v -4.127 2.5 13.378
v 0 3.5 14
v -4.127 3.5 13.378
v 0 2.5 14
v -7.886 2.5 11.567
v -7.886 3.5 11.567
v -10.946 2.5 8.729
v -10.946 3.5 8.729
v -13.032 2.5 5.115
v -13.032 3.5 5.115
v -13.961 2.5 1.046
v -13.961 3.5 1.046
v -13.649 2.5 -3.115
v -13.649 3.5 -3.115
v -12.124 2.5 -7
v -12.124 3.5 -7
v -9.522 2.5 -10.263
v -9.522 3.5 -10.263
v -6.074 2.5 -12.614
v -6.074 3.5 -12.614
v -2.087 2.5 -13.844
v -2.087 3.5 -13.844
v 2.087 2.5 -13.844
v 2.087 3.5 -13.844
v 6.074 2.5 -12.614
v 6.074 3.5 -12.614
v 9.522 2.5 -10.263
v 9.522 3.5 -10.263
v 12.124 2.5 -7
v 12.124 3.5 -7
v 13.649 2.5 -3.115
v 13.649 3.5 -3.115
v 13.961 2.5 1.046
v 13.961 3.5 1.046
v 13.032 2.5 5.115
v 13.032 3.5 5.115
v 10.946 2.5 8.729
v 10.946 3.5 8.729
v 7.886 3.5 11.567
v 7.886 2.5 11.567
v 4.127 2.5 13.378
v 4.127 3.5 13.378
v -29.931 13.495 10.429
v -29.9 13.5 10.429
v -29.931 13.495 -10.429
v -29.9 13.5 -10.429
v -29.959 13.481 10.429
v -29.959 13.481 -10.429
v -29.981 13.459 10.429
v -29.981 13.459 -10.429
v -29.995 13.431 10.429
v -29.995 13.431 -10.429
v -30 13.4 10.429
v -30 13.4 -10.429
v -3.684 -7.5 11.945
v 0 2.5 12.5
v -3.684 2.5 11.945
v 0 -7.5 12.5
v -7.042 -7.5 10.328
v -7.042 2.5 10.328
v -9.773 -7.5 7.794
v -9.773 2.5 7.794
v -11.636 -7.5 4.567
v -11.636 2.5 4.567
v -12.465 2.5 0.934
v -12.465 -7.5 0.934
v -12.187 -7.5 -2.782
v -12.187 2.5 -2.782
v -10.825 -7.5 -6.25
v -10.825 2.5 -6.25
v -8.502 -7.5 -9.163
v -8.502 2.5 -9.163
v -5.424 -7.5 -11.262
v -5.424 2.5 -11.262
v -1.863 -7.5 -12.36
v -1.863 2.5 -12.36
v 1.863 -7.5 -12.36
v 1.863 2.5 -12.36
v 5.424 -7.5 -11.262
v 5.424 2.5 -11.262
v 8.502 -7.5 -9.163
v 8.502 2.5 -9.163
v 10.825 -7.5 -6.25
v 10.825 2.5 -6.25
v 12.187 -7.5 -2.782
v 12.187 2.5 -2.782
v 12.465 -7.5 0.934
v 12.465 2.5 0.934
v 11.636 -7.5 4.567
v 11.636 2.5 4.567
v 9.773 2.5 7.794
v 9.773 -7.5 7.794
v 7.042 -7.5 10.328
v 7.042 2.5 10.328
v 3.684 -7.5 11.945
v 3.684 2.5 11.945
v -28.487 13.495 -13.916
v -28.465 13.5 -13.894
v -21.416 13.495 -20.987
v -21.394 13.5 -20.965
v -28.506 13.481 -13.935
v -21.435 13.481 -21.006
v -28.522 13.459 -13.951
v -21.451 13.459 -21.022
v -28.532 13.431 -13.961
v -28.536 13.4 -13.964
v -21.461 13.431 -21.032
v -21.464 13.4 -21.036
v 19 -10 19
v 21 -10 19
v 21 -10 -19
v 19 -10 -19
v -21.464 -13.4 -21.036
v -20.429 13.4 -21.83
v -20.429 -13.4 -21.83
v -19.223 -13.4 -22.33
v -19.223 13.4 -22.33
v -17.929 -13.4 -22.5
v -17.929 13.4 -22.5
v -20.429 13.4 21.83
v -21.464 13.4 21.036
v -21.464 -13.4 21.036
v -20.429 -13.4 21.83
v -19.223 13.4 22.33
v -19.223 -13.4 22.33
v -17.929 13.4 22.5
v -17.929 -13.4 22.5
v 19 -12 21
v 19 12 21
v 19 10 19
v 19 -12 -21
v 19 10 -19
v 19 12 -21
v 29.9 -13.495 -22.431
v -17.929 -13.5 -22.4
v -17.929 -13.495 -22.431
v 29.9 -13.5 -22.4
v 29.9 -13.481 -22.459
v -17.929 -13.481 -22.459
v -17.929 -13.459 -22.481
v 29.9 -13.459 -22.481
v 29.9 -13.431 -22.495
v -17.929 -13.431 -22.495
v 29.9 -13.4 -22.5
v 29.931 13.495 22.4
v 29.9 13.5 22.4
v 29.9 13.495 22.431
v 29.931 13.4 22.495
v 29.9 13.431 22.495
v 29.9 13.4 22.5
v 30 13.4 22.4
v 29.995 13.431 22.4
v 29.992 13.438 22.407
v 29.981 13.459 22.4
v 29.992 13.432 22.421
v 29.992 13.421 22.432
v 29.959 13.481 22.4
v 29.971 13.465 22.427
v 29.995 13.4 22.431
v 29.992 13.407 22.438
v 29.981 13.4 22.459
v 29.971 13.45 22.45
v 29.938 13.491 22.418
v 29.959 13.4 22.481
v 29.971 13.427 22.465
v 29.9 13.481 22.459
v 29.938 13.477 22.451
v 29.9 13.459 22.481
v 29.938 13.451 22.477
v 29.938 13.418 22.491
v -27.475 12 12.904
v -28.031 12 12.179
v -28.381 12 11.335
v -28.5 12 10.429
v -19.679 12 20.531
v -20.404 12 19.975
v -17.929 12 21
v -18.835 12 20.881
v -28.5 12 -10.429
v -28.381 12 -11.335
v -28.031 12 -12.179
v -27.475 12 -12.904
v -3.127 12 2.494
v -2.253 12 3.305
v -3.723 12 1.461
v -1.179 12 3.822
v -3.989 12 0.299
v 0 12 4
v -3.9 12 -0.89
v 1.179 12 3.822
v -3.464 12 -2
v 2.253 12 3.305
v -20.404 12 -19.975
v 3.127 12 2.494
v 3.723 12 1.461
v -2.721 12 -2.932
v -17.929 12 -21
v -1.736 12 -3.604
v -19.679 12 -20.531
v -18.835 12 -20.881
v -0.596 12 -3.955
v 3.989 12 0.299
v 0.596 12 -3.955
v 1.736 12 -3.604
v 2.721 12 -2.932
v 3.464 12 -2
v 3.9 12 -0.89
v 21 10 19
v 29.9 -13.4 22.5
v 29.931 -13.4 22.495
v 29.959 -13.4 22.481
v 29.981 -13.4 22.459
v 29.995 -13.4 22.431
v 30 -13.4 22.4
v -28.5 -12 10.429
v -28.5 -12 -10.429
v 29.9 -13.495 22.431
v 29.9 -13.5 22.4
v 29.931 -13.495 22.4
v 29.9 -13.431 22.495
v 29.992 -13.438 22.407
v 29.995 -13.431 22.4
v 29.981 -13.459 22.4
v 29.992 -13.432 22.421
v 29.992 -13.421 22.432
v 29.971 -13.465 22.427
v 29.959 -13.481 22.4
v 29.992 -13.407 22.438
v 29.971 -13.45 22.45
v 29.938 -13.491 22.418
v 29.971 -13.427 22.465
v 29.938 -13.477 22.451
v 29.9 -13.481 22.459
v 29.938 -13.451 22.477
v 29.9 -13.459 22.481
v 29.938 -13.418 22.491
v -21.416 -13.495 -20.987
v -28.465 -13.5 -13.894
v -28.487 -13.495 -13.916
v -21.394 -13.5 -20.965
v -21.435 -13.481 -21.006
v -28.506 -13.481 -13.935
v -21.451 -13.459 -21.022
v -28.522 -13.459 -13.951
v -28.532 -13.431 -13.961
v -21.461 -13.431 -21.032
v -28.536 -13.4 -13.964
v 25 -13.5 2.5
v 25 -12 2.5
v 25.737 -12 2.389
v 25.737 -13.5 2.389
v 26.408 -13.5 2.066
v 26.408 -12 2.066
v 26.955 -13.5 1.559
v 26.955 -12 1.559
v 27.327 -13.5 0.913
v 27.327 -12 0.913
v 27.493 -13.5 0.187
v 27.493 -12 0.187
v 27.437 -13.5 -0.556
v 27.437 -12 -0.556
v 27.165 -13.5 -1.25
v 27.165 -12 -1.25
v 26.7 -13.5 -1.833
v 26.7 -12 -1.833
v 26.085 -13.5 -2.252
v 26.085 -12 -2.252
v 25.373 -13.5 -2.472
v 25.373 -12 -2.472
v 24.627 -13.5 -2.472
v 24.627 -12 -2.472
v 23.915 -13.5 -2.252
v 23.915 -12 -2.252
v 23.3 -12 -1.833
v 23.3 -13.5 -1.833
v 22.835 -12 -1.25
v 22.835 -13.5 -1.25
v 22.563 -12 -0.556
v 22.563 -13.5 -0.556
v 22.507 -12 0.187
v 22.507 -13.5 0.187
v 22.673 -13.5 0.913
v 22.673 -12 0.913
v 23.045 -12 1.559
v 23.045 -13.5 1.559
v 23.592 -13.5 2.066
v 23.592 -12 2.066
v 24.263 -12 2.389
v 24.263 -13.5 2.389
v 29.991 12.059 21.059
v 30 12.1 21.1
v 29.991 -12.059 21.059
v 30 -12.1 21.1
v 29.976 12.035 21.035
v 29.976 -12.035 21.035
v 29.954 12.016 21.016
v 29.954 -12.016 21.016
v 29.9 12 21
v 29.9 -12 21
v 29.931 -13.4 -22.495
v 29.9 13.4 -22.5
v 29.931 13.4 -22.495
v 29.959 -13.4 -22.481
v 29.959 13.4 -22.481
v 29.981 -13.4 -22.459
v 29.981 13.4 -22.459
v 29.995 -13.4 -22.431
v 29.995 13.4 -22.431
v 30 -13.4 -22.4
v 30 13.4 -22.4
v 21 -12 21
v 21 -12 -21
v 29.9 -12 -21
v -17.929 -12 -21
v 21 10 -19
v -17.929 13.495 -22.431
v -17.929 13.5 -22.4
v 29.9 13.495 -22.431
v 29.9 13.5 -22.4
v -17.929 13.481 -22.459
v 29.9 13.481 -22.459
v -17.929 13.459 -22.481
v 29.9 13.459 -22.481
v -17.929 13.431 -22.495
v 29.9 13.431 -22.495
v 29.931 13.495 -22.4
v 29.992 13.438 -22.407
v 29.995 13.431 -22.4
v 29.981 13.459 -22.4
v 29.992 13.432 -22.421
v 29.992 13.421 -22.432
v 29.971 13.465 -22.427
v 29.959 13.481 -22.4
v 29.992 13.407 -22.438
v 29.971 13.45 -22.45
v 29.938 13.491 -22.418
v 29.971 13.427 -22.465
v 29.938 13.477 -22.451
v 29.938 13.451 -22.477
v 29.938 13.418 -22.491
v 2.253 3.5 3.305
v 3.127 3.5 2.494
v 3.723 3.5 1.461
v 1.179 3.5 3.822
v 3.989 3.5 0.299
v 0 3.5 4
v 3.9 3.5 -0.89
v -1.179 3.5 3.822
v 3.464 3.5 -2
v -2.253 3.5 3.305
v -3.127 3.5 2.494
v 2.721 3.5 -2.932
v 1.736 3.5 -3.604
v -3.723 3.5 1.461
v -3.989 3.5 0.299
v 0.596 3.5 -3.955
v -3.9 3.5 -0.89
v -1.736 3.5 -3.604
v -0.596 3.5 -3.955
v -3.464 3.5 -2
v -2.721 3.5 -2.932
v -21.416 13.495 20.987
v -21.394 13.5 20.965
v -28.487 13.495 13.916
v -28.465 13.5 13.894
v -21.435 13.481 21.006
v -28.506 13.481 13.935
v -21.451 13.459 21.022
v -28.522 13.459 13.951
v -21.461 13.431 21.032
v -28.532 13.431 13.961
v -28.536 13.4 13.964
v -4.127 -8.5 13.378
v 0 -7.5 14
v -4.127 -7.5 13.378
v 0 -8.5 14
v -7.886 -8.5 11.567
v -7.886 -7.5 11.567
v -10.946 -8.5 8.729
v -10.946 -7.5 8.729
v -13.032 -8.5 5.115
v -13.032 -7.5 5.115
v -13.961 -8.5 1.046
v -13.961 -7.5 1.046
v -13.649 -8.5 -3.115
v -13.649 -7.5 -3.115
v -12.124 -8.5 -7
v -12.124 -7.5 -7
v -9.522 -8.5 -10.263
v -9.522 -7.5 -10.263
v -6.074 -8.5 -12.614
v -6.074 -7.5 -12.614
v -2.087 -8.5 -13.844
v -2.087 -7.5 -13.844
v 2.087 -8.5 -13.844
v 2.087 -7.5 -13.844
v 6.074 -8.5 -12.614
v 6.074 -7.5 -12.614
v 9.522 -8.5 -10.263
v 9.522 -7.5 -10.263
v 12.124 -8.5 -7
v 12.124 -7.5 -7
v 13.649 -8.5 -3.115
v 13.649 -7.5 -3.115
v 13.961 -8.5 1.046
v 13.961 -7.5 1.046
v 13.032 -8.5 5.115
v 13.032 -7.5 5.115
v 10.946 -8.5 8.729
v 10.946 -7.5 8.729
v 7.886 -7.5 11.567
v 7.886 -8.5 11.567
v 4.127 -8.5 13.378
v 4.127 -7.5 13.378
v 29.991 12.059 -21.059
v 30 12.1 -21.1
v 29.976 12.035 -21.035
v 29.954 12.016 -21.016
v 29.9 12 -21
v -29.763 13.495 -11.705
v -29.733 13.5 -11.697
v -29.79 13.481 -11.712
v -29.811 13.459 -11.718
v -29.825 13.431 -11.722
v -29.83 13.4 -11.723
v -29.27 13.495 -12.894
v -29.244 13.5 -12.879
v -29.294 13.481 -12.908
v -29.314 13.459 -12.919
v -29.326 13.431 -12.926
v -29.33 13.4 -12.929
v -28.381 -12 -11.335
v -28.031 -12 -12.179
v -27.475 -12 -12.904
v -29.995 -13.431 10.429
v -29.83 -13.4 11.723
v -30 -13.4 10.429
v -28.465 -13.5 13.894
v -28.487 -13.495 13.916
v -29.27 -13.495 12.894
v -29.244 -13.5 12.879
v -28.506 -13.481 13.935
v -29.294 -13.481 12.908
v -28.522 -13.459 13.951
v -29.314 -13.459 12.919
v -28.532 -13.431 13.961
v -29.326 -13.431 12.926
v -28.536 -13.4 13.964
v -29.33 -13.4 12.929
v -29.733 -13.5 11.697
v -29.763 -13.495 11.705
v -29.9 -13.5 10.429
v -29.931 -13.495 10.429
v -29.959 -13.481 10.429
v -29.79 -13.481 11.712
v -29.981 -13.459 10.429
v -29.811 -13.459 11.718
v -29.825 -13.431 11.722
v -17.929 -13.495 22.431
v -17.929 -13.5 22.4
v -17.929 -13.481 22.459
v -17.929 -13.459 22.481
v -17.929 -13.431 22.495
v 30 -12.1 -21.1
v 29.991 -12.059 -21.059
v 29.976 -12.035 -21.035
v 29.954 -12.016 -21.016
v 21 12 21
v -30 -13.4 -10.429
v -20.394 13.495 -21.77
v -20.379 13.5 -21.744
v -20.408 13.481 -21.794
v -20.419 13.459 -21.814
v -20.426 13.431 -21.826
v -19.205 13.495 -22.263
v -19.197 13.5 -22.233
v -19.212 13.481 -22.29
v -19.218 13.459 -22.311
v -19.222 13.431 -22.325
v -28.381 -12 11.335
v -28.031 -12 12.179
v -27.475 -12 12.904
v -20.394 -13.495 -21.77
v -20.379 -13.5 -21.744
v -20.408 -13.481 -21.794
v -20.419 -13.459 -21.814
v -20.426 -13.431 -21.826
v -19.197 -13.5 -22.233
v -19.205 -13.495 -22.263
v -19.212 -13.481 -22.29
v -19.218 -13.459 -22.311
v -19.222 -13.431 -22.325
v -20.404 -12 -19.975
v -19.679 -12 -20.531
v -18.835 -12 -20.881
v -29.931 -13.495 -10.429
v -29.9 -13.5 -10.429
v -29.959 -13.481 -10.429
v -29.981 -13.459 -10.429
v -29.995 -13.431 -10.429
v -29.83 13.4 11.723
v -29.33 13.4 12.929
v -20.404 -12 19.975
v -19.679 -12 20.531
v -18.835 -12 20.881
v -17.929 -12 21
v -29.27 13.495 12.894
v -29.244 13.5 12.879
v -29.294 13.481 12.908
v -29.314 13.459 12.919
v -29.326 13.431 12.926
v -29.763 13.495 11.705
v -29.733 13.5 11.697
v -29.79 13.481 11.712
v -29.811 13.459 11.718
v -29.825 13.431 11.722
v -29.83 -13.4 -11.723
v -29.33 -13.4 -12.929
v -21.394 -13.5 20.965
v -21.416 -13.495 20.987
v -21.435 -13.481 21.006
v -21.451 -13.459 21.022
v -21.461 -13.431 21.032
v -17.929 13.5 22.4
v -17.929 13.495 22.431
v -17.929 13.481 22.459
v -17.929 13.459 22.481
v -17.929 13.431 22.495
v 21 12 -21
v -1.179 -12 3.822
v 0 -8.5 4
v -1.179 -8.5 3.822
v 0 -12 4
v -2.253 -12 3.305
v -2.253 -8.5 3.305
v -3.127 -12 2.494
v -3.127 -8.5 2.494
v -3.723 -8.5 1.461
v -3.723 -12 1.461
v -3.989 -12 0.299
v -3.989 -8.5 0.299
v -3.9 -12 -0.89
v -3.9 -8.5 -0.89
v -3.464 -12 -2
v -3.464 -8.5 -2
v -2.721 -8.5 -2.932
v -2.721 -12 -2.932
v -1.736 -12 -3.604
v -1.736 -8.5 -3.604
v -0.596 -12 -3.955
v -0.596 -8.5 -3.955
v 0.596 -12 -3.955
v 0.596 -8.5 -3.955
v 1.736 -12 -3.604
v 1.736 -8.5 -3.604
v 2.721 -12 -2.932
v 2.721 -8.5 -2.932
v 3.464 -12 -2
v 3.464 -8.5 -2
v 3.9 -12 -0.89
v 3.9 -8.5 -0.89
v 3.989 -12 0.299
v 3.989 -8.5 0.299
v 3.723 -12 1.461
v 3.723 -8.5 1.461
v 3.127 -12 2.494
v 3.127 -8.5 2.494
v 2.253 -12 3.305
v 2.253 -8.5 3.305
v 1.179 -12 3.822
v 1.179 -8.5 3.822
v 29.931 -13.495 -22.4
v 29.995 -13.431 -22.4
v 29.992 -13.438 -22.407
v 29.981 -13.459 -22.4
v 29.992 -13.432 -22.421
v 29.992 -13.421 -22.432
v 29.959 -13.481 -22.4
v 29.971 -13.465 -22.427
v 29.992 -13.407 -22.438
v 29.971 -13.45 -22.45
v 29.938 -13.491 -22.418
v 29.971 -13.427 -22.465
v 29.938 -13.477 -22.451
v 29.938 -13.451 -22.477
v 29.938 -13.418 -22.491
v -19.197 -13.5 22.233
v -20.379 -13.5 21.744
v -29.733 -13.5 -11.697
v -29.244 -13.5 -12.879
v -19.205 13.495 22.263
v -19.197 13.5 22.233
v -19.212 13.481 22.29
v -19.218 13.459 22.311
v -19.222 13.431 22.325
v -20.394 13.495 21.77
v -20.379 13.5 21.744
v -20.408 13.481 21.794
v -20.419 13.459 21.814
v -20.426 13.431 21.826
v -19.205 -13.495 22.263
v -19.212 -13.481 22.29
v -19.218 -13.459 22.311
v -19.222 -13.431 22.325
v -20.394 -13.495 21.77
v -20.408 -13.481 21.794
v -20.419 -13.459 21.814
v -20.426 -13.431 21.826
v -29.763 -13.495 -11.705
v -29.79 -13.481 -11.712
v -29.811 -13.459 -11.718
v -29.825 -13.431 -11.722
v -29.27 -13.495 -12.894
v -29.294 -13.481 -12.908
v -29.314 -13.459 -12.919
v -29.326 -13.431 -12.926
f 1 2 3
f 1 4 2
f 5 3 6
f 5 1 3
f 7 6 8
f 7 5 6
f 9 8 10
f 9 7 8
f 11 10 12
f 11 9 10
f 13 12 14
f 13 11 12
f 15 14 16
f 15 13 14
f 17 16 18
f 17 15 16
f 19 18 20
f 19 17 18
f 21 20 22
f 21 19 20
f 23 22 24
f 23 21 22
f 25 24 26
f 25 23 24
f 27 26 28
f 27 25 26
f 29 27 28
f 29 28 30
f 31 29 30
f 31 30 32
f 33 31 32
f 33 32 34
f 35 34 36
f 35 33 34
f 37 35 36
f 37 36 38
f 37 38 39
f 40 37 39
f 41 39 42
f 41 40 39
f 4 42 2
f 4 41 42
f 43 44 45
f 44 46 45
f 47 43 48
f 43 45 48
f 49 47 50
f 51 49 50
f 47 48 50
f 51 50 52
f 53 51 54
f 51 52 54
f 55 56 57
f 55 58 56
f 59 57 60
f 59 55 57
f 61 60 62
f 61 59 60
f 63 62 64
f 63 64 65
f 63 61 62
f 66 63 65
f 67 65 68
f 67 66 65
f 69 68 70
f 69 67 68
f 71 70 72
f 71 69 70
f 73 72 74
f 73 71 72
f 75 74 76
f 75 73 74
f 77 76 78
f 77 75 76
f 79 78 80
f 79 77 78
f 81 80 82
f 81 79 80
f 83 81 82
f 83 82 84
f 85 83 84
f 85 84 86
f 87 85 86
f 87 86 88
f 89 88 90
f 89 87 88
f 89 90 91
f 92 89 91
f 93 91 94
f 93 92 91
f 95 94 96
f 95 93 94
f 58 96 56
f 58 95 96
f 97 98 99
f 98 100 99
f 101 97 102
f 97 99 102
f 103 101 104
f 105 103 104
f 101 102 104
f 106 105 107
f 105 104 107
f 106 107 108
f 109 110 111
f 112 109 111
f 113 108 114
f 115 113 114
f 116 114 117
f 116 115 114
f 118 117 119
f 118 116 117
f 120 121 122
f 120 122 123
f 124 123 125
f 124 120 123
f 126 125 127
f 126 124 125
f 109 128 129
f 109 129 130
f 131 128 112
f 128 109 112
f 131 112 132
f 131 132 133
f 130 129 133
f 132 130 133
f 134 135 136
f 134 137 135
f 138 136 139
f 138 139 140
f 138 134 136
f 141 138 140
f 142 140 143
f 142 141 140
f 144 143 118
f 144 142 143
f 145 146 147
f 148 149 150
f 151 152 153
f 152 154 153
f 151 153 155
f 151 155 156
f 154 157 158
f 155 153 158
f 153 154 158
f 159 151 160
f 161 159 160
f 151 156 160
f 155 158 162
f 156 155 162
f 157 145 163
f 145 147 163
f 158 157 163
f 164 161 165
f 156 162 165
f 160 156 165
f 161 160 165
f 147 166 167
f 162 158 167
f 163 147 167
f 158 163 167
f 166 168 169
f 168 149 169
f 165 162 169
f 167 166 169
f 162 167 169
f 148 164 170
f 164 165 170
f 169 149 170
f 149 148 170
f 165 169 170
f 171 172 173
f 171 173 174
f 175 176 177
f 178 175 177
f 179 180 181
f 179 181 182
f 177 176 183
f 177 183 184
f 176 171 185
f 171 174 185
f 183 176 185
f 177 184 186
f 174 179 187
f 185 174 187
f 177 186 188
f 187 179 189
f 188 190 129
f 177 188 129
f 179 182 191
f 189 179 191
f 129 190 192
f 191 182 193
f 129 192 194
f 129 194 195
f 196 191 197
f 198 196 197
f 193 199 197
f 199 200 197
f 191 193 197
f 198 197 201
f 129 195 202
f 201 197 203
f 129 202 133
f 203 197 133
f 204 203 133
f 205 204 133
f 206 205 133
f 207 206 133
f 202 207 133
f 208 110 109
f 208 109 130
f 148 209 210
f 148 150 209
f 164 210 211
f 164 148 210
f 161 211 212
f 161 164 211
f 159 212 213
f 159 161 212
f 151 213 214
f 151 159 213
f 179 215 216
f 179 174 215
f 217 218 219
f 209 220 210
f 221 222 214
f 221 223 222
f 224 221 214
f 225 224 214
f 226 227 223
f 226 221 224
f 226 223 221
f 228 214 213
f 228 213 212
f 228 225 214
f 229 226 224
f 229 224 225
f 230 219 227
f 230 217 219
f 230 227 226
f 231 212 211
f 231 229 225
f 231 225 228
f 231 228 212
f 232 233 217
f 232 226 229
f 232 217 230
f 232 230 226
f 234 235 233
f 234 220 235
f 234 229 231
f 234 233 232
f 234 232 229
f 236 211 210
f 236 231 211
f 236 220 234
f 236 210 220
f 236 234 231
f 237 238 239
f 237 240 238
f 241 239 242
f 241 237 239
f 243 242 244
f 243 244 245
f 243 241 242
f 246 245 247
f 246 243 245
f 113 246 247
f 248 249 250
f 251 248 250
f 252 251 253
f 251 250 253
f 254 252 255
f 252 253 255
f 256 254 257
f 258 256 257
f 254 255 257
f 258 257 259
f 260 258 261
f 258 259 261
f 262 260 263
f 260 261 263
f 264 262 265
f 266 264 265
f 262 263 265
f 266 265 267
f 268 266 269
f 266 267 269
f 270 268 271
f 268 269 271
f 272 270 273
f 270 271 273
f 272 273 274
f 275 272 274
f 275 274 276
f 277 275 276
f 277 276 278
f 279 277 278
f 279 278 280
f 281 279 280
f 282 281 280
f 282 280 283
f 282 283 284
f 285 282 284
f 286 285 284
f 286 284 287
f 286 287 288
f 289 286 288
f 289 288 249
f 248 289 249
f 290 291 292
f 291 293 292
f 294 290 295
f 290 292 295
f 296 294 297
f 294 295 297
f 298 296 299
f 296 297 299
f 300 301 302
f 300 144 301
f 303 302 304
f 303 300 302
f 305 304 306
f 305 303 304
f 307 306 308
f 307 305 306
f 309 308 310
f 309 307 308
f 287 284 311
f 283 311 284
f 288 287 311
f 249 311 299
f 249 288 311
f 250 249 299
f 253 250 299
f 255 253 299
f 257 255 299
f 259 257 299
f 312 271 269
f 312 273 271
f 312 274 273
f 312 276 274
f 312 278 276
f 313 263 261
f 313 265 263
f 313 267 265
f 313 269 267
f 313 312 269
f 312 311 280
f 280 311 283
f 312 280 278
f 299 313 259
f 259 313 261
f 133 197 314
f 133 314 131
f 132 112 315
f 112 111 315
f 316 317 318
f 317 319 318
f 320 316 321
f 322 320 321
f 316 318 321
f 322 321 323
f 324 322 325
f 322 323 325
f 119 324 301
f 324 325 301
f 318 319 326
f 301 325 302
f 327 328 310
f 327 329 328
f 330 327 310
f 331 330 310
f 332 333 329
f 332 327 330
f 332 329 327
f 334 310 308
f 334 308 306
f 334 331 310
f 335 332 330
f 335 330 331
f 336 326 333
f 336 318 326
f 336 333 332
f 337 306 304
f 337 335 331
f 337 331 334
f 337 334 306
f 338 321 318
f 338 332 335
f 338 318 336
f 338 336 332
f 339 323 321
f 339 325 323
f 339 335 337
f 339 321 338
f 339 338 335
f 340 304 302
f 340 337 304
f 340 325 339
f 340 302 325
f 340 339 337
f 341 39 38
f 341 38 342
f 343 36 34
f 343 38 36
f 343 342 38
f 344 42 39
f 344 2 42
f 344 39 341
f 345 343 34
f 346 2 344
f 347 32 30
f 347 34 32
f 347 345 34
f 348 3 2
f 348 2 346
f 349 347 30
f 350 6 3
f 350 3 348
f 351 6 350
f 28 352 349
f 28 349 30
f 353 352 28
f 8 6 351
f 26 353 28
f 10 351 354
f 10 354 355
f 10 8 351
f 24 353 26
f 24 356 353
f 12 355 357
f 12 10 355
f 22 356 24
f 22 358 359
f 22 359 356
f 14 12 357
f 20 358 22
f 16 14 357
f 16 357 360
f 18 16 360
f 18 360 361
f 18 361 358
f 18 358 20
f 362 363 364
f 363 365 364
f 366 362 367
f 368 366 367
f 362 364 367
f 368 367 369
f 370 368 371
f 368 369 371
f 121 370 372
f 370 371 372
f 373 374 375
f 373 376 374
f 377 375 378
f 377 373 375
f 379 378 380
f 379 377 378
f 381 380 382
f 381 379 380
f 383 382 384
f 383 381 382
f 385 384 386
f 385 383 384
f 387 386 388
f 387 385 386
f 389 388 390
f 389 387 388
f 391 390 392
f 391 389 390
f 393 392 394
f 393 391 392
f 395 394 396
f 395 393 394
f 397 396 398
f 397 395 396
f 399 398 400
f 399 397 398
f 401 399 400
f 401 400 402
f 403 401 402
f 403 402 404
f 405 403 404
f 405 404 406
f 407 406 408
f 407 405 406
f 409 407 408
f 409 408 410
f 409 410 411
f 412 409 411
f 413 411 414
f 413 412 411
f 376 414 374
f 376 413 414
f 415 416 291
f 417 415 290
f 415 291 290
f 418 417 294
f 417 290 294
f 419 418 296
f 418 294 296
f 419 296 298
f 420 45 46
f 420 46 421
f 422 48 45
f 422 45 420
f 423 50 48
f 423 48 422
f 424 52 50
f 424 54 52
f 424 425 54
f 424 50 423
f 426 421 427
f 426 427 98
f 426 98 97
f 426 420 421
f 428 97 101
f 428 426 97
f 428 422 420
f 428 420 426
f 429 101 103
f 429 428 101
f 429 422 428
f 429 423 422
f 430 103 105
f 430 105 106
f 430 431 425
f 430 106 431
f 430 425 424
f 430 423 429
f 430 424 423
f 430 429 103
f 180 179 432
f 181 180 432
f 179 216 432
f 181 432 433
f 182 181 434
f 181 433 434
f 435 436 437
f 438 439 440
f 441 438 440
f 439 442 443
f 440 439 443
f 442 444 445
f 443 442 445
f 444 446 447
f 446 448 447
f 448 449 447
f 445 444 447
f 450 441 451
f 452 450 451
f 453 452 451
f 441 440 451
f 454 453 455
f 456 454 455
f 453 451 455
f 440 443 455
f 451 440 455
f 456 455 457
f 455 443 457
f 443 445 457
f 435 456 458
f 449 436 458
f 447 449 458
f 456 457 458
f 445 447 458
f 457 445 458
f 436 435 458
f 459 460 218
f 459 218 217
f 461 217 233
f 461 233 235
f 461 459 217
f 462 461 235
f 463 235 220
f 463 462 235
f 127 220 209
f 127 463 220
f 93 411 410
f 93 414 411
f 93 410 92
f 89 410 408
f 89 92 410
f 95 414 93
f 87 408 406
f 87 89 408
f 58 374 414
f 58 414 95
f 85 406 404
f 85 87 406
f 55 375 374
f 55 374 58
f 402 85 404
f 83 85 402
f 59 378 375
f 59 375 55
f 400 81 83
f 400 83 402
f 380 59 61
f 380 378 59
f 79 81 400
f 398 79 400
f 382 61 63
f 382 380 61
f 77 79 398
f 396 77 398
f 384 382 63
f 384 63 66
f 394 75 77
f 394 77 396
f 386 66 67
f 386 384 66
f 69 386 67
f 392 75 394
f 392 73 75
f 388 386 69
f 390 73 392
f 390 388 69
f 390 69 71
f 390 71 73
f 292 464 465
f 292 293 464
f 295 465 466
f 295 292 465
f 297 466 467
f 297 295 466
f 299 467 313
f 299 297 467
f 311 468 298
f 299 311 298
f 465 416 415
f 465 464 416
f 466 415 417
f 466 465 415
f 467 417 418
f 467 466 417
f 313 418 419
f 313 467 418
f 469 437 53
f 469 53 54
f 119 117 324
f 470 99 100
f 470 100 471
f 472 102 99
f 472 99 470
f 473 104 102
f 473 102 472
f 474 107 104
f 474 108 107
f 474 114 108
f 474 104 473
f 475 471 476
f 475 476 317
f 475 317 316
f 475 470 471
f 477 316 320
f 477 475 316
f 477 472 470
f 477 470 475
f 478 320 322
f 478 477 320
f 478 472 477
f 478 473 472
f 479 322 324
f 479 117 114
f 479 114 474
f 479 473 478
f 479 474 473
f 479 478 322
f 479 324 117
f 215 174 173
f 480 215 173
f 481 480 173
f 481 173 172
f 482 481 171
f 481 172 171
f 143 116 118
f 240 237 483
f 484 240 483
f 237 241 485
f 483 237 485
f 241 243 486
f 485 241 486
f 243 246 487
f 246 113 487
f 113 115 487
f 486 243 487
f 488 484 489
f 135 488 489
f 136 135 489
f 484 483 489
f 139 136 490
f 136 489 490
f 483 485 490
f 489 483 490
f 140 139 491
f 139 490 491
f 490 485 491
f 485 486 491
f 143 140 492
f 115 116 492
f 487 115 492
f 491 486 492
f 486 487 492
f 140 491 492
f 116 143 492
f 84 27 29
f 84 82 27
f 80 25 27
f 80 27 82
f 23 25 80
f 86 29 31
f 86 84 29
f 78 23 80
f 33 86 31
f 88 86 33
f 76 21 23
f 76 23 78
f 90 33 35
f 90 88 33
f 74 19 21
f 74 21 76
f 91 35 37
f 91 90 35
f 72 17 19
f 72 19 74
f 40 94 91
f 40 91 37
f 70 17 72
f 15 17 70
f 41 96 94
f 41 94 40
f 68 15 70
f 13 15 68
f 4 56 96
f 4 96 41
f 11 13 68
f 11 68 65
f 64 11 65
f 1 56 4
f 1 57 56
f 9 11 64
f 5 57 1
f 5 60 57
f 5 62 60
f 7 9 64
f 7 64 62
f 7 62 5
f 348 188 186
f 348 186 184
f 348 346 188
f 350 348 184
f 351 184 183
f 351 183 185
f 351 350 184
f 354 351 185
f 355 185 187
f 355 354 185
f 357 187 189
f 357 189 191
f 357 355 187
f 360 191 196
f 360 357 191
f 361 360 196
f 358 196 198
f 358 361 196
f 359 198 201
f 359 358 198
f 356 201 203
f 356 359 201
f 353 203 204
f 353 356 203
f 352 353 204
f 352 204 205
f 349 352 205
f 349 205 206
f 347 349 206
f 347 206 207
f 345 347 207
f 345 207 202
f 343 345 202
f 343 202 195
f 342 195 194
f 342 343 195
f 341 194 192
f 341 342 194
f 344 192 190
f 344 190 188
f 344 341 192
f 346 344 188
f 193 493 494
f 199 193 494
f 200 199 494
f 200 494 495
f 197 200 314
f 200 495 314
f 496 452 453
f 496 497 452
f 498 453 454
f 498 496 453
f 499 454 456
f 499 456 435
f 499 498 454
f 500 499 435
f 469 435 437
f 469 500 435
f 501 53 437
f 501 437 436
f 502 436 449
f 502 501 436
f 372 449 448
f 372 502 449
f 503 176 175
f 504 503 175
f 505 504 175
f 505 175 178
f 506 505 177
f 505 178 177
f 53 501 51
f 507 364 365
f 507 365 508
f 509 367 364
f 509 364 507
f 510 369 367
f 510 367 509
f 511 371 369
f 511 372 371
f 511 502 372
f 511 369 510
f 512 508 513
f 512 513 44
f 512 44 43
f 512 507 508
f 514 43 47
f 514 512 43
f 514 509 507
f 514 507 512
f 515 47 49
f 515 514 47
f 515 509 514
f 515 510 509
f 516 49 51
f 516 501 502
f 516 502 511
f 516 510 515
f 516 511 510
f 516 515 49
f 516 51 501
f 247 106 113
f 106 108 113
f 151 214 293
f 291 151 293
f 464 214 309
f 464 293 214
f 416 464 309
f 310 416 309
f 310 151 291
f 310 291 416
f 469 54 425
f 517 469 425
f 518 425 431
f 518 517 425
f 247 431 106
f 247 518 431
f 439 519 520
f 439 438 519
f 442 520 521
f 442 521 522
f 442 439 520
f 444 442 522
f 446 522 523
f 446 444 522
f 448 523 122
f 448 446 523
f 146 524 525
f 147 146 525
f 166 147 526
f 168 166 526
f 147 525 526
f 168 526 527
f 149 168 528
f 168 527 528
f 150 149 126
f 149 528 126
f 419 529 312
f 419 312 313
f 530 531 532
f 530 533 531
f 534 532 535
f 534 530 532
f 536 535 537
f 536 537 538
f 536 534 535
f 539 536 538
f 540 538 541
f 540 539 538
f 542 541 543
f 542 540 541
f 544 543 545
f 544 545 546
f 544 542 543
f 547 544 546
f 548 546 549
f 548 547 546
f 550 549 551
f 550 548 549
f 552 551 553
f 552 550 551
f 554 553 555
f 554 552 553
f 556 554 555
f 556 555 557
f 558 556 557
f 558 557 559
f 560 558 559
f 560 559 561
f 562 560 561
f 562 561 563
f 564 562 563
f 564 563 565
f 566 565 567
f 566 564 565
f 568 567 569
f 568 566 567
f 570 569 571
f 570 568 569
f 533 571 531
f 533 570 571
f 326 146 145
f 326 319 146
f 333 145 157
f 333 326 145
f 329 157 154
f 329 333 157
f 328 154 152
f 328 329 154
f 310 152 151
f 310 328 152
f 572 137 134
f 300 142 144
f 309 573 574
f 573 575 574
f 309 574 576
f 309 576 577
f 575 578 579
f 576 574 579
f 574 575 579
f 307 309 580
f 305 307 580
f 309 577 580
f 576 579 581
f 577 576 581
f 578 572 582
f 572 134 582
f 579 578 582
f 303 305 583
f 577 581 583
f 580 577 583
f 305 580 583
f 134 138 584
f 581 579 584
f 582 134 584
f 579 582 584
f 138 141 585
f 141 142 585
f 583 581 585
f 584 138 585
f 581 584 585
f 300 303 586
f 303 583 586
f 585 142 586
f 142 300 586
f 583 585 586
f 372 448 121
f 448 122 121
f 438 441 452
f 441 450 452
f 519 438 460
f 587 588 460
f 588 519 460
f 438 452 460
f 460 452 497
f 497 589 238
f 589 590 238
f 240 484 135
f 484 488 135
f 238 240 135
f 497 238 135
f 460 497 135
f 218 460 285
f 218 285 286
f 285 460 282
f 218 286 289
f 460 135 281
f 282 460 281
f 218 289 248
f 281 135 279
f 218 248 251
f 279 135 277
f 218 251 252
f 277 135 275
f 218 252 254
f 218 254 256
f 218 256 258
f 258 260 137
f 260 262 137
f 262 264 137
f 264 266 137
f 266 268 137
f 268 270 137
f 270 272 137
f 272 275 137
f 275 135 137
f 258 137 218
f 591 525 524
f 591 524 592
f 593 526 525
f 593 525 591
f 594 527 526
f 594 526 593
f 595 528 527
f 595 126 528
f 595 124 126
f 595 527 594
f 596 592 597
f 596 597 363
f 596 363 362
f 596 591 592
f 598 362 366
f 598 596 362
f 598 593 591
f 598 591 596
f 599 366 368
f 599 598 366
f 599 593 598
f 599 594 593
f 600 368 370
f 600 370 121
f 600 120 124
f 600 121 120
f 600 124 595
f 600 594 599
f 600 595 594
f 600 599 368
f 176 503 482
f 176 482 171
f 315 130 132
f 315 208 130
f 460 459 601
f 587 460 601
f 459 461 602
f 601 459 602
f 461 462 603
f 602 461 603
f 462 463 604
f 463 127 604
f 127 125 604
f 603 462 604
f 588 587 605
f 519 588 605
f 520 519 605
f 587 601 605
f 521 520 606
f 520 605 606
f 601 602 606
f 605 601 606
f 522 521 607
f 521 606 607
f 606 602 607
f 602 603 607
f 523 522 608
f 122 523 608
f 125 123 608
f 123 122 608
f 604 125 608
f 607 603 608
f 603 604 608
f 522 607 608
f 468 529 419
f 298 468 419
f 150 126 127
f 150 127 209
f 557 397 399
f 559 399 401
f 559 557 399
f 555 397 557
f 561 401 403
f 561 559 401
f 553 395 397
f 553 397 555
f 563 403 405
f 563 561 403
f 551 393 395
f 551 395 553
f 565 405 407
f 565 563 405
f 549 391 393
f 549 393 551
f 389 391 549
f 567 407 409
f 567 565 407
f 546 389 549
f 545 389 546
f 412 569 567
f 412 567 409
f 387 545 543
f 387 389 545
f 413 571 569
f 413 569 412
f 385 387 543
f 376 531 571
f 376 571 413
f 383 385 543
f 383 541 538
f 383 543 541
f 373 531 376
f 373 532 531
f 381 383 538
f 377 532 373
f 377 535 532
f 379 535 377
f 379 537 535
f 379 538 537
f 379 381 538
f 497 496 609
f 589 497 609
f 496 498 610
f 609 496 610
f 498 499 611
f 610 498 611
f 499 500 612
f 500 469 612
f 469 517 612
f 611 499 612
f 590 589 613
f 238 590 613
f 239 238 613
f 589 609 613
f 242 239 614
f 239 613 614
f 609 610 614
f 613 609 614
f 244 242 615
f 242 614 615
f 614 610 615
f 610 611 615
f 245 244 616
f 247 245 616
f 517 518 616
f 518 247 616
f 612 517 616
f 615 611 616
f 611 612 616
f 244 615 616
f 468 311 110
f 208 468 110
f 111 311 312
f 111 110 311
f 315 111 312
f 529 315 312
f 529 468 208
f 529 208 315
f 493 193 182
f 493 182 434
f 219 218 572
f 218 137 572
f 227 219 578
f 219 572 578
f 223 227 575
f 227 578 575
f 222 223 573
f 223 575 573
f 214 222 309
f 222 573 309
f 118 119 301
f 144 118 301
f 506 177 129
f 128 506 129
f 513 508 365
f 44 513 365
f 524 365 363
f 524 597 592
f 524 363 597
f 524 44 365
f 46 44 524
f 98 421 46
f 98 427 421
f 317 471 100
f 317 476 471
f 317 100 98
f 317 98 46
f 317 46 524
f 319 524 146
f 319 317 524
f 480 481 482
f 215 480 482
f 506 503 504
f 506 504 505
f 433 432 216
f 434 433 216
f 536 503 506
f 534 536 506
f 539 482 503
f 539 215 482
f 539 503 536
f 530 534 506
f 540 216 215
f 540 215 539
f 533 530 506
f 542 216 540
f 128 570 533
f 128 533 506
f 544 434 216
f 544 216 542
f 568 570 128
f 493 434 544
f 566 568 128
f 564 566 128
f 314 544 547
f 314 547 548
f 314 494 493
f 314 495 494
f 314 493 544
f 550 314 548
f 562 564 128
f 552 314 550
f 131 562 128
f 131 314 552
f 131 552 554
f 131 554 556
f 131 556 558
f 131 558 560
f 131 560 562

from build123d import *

# Parameters (mm, degrees)
SKETCH_1_W          = 60
SKETCH_1_H          = 45
EXTRUDE_1_DEPTH     = 13.5
CHAMFER_1_SIZE      = 10
FILLET_1_R          = 5
SHELL_1_T           = -1.5
FILLET_2_R          = 0.1
SKETCH_4_W          = 42
SKETCH_4_H          = 24
SKETCH_4_W_2        = 38
SKETCH_4_H_2        = 20
EXTRUDE_1_2_DEPTH   = 1
CUT_EXTRUDE_1_REACH = 47.349
SKETCH_7_R          = 2.5


with BuildPart() as part:
    # 草图1 → Extrude 1 (new, symmetric)
    with BuildSketch(Plane(origin=(0, 0, 0), x_dir=(1, 0, 0), z_dir=(0, 1, 0))):
        Rectangle(SKETCH_1_W, SKETCH_1_H)
    extrude(amount=EXTRUDE_1_DEPTH, both=True)

    # 倒角1
    chamfer_1_edges = [part.edges().sort_by_distance(p)[0] for p in [
        (-30, 0, 22.5),
        (-30, 0, -22.5),
    ]]
    chamfer(chamfer_1_edges, length=CHAMFER_1_SIZE)

    # 圆角1
    fillet_1_edges = [part.edges().sort_by_distance(p)[0] for p in [
        (-30, 0, 12.5),
        (-30, 0, -12.5),
        (-20, 0, -22.5),
        (-20, 0, 22.5),
    ]]
    fillet(fillet_1_edges, radius=FILLET_1_R)

    # 抽壳1
    shell_1_openings = [part.faces().sort_by_distance(p)[0] for p in [
        (30, 0, 0),
    ]]
    offset(amount=SHELL_1_T, openings=shell_1_openings, kind=Kind.INTERSECTION)

    # 圆角2
    fillet_2_edges = [part.edges().sort_by_distance(p)[0] for p in [
        (-25, 13.5, -17.5),
        (-30, 13.5, 0),
        (-25, 13.5, 17.5),
        (6.035533906, 13.5, 22.5),
        (-19.84234935, 13.5, 22.119397663),
        (-29.619397663, 13.5, 12.34234935),
        (-29.619397663, 13.5, -12.34234935),
        (-19.84234935, 13.5, -22.119397663),
        (-25, -13.5, -17.5),
        (-30, -13.5, 0),
        (6.035533906, -13.5, 22.5),
        (-25, -13.5, 17.5),
        (-19.84234935, -13.5, 22.119397663),
        (-29.619397663, -13.5, 12.34234935),
        (-29.619397663, -13.5, -12.34234935),
        (-19.84234935, -13.5, -22.119397663),
        (30, 13.5, 0),
        (6.035533906, -13.5, -22.5),
        (30, -12, 0),
        (30, 0, 21),
        (30, 0, -21),
        (30, 12, 0),
        (30, -13.5, 0),
        (6.035533906, 13.5, -22.5),
        (30, 0, 22.5),
        (30, 0, -22.5),
    ]]
    fillet(fillet_2_edges, radius=FILLET_2_R)

    # 草图3 → 旋转1 (revolve)
    with BuildSketch(Plane.XY, mode=Mode.PRIVATE) as revolve_1_sk:
        Polygon((0, 12), (4, 12), (4, 3.5), (14, 3.5), (14, 2.5), (12.5, 2.5), (12.5, -7.5), (14, -7.5), (14, -8.5), (4, -8.5), (4, -12), (0, -12), align=None)
    revolve(revolve_1_sk.sketch.rotate(Axis((0, 13.4, 0), (0, -1, 0)), 90), axis=Axis((0, 13.4, 0), (0, -1, 0)))

    # 草图4 → Extrude 1 2 (add, symmetric)
    with BuildSketch(Plane(origin=(20, 0, 0), x_dir=(0, 0, -1), z_dir=(1, 0, 0))):
        Rectangle(SKETCH_4_W, SKETCH_4_H)
        Rectangle(SKETCH_4_W_2, SKETCH_4_H_2, mode=Mode.SUBTRACT)
    extrude(amount=EXTRUDE_1_2_DEPTH, both=True)

    # 草图7 → 切除-拉伸1 (cut, up to next)
    with BuildSketch(Plane(origin=(0, -12, 0), x_dir=(1, 0, 0), z_dir=(0, 1, 0)), mode=Mode.PRIVATE) as cut_extrude_1_sk1:
        with Locations(Location((25, 0, 0), (0, 0, 270))):
            Circle(SKETCH_7_R)
    cut_extrude_1_tool1 = extrude(cut_extrude_1_sk1.sketch, amount=-CUT_EXTRUDE_1_REACH, mode=Mode.PRIVATE) & part.part
    add(cut_extrude_1_tool1.solids().sort_by_distance((25, -12, 0))[0], mode=Mode.SUBTRACT)


solid = part.part
